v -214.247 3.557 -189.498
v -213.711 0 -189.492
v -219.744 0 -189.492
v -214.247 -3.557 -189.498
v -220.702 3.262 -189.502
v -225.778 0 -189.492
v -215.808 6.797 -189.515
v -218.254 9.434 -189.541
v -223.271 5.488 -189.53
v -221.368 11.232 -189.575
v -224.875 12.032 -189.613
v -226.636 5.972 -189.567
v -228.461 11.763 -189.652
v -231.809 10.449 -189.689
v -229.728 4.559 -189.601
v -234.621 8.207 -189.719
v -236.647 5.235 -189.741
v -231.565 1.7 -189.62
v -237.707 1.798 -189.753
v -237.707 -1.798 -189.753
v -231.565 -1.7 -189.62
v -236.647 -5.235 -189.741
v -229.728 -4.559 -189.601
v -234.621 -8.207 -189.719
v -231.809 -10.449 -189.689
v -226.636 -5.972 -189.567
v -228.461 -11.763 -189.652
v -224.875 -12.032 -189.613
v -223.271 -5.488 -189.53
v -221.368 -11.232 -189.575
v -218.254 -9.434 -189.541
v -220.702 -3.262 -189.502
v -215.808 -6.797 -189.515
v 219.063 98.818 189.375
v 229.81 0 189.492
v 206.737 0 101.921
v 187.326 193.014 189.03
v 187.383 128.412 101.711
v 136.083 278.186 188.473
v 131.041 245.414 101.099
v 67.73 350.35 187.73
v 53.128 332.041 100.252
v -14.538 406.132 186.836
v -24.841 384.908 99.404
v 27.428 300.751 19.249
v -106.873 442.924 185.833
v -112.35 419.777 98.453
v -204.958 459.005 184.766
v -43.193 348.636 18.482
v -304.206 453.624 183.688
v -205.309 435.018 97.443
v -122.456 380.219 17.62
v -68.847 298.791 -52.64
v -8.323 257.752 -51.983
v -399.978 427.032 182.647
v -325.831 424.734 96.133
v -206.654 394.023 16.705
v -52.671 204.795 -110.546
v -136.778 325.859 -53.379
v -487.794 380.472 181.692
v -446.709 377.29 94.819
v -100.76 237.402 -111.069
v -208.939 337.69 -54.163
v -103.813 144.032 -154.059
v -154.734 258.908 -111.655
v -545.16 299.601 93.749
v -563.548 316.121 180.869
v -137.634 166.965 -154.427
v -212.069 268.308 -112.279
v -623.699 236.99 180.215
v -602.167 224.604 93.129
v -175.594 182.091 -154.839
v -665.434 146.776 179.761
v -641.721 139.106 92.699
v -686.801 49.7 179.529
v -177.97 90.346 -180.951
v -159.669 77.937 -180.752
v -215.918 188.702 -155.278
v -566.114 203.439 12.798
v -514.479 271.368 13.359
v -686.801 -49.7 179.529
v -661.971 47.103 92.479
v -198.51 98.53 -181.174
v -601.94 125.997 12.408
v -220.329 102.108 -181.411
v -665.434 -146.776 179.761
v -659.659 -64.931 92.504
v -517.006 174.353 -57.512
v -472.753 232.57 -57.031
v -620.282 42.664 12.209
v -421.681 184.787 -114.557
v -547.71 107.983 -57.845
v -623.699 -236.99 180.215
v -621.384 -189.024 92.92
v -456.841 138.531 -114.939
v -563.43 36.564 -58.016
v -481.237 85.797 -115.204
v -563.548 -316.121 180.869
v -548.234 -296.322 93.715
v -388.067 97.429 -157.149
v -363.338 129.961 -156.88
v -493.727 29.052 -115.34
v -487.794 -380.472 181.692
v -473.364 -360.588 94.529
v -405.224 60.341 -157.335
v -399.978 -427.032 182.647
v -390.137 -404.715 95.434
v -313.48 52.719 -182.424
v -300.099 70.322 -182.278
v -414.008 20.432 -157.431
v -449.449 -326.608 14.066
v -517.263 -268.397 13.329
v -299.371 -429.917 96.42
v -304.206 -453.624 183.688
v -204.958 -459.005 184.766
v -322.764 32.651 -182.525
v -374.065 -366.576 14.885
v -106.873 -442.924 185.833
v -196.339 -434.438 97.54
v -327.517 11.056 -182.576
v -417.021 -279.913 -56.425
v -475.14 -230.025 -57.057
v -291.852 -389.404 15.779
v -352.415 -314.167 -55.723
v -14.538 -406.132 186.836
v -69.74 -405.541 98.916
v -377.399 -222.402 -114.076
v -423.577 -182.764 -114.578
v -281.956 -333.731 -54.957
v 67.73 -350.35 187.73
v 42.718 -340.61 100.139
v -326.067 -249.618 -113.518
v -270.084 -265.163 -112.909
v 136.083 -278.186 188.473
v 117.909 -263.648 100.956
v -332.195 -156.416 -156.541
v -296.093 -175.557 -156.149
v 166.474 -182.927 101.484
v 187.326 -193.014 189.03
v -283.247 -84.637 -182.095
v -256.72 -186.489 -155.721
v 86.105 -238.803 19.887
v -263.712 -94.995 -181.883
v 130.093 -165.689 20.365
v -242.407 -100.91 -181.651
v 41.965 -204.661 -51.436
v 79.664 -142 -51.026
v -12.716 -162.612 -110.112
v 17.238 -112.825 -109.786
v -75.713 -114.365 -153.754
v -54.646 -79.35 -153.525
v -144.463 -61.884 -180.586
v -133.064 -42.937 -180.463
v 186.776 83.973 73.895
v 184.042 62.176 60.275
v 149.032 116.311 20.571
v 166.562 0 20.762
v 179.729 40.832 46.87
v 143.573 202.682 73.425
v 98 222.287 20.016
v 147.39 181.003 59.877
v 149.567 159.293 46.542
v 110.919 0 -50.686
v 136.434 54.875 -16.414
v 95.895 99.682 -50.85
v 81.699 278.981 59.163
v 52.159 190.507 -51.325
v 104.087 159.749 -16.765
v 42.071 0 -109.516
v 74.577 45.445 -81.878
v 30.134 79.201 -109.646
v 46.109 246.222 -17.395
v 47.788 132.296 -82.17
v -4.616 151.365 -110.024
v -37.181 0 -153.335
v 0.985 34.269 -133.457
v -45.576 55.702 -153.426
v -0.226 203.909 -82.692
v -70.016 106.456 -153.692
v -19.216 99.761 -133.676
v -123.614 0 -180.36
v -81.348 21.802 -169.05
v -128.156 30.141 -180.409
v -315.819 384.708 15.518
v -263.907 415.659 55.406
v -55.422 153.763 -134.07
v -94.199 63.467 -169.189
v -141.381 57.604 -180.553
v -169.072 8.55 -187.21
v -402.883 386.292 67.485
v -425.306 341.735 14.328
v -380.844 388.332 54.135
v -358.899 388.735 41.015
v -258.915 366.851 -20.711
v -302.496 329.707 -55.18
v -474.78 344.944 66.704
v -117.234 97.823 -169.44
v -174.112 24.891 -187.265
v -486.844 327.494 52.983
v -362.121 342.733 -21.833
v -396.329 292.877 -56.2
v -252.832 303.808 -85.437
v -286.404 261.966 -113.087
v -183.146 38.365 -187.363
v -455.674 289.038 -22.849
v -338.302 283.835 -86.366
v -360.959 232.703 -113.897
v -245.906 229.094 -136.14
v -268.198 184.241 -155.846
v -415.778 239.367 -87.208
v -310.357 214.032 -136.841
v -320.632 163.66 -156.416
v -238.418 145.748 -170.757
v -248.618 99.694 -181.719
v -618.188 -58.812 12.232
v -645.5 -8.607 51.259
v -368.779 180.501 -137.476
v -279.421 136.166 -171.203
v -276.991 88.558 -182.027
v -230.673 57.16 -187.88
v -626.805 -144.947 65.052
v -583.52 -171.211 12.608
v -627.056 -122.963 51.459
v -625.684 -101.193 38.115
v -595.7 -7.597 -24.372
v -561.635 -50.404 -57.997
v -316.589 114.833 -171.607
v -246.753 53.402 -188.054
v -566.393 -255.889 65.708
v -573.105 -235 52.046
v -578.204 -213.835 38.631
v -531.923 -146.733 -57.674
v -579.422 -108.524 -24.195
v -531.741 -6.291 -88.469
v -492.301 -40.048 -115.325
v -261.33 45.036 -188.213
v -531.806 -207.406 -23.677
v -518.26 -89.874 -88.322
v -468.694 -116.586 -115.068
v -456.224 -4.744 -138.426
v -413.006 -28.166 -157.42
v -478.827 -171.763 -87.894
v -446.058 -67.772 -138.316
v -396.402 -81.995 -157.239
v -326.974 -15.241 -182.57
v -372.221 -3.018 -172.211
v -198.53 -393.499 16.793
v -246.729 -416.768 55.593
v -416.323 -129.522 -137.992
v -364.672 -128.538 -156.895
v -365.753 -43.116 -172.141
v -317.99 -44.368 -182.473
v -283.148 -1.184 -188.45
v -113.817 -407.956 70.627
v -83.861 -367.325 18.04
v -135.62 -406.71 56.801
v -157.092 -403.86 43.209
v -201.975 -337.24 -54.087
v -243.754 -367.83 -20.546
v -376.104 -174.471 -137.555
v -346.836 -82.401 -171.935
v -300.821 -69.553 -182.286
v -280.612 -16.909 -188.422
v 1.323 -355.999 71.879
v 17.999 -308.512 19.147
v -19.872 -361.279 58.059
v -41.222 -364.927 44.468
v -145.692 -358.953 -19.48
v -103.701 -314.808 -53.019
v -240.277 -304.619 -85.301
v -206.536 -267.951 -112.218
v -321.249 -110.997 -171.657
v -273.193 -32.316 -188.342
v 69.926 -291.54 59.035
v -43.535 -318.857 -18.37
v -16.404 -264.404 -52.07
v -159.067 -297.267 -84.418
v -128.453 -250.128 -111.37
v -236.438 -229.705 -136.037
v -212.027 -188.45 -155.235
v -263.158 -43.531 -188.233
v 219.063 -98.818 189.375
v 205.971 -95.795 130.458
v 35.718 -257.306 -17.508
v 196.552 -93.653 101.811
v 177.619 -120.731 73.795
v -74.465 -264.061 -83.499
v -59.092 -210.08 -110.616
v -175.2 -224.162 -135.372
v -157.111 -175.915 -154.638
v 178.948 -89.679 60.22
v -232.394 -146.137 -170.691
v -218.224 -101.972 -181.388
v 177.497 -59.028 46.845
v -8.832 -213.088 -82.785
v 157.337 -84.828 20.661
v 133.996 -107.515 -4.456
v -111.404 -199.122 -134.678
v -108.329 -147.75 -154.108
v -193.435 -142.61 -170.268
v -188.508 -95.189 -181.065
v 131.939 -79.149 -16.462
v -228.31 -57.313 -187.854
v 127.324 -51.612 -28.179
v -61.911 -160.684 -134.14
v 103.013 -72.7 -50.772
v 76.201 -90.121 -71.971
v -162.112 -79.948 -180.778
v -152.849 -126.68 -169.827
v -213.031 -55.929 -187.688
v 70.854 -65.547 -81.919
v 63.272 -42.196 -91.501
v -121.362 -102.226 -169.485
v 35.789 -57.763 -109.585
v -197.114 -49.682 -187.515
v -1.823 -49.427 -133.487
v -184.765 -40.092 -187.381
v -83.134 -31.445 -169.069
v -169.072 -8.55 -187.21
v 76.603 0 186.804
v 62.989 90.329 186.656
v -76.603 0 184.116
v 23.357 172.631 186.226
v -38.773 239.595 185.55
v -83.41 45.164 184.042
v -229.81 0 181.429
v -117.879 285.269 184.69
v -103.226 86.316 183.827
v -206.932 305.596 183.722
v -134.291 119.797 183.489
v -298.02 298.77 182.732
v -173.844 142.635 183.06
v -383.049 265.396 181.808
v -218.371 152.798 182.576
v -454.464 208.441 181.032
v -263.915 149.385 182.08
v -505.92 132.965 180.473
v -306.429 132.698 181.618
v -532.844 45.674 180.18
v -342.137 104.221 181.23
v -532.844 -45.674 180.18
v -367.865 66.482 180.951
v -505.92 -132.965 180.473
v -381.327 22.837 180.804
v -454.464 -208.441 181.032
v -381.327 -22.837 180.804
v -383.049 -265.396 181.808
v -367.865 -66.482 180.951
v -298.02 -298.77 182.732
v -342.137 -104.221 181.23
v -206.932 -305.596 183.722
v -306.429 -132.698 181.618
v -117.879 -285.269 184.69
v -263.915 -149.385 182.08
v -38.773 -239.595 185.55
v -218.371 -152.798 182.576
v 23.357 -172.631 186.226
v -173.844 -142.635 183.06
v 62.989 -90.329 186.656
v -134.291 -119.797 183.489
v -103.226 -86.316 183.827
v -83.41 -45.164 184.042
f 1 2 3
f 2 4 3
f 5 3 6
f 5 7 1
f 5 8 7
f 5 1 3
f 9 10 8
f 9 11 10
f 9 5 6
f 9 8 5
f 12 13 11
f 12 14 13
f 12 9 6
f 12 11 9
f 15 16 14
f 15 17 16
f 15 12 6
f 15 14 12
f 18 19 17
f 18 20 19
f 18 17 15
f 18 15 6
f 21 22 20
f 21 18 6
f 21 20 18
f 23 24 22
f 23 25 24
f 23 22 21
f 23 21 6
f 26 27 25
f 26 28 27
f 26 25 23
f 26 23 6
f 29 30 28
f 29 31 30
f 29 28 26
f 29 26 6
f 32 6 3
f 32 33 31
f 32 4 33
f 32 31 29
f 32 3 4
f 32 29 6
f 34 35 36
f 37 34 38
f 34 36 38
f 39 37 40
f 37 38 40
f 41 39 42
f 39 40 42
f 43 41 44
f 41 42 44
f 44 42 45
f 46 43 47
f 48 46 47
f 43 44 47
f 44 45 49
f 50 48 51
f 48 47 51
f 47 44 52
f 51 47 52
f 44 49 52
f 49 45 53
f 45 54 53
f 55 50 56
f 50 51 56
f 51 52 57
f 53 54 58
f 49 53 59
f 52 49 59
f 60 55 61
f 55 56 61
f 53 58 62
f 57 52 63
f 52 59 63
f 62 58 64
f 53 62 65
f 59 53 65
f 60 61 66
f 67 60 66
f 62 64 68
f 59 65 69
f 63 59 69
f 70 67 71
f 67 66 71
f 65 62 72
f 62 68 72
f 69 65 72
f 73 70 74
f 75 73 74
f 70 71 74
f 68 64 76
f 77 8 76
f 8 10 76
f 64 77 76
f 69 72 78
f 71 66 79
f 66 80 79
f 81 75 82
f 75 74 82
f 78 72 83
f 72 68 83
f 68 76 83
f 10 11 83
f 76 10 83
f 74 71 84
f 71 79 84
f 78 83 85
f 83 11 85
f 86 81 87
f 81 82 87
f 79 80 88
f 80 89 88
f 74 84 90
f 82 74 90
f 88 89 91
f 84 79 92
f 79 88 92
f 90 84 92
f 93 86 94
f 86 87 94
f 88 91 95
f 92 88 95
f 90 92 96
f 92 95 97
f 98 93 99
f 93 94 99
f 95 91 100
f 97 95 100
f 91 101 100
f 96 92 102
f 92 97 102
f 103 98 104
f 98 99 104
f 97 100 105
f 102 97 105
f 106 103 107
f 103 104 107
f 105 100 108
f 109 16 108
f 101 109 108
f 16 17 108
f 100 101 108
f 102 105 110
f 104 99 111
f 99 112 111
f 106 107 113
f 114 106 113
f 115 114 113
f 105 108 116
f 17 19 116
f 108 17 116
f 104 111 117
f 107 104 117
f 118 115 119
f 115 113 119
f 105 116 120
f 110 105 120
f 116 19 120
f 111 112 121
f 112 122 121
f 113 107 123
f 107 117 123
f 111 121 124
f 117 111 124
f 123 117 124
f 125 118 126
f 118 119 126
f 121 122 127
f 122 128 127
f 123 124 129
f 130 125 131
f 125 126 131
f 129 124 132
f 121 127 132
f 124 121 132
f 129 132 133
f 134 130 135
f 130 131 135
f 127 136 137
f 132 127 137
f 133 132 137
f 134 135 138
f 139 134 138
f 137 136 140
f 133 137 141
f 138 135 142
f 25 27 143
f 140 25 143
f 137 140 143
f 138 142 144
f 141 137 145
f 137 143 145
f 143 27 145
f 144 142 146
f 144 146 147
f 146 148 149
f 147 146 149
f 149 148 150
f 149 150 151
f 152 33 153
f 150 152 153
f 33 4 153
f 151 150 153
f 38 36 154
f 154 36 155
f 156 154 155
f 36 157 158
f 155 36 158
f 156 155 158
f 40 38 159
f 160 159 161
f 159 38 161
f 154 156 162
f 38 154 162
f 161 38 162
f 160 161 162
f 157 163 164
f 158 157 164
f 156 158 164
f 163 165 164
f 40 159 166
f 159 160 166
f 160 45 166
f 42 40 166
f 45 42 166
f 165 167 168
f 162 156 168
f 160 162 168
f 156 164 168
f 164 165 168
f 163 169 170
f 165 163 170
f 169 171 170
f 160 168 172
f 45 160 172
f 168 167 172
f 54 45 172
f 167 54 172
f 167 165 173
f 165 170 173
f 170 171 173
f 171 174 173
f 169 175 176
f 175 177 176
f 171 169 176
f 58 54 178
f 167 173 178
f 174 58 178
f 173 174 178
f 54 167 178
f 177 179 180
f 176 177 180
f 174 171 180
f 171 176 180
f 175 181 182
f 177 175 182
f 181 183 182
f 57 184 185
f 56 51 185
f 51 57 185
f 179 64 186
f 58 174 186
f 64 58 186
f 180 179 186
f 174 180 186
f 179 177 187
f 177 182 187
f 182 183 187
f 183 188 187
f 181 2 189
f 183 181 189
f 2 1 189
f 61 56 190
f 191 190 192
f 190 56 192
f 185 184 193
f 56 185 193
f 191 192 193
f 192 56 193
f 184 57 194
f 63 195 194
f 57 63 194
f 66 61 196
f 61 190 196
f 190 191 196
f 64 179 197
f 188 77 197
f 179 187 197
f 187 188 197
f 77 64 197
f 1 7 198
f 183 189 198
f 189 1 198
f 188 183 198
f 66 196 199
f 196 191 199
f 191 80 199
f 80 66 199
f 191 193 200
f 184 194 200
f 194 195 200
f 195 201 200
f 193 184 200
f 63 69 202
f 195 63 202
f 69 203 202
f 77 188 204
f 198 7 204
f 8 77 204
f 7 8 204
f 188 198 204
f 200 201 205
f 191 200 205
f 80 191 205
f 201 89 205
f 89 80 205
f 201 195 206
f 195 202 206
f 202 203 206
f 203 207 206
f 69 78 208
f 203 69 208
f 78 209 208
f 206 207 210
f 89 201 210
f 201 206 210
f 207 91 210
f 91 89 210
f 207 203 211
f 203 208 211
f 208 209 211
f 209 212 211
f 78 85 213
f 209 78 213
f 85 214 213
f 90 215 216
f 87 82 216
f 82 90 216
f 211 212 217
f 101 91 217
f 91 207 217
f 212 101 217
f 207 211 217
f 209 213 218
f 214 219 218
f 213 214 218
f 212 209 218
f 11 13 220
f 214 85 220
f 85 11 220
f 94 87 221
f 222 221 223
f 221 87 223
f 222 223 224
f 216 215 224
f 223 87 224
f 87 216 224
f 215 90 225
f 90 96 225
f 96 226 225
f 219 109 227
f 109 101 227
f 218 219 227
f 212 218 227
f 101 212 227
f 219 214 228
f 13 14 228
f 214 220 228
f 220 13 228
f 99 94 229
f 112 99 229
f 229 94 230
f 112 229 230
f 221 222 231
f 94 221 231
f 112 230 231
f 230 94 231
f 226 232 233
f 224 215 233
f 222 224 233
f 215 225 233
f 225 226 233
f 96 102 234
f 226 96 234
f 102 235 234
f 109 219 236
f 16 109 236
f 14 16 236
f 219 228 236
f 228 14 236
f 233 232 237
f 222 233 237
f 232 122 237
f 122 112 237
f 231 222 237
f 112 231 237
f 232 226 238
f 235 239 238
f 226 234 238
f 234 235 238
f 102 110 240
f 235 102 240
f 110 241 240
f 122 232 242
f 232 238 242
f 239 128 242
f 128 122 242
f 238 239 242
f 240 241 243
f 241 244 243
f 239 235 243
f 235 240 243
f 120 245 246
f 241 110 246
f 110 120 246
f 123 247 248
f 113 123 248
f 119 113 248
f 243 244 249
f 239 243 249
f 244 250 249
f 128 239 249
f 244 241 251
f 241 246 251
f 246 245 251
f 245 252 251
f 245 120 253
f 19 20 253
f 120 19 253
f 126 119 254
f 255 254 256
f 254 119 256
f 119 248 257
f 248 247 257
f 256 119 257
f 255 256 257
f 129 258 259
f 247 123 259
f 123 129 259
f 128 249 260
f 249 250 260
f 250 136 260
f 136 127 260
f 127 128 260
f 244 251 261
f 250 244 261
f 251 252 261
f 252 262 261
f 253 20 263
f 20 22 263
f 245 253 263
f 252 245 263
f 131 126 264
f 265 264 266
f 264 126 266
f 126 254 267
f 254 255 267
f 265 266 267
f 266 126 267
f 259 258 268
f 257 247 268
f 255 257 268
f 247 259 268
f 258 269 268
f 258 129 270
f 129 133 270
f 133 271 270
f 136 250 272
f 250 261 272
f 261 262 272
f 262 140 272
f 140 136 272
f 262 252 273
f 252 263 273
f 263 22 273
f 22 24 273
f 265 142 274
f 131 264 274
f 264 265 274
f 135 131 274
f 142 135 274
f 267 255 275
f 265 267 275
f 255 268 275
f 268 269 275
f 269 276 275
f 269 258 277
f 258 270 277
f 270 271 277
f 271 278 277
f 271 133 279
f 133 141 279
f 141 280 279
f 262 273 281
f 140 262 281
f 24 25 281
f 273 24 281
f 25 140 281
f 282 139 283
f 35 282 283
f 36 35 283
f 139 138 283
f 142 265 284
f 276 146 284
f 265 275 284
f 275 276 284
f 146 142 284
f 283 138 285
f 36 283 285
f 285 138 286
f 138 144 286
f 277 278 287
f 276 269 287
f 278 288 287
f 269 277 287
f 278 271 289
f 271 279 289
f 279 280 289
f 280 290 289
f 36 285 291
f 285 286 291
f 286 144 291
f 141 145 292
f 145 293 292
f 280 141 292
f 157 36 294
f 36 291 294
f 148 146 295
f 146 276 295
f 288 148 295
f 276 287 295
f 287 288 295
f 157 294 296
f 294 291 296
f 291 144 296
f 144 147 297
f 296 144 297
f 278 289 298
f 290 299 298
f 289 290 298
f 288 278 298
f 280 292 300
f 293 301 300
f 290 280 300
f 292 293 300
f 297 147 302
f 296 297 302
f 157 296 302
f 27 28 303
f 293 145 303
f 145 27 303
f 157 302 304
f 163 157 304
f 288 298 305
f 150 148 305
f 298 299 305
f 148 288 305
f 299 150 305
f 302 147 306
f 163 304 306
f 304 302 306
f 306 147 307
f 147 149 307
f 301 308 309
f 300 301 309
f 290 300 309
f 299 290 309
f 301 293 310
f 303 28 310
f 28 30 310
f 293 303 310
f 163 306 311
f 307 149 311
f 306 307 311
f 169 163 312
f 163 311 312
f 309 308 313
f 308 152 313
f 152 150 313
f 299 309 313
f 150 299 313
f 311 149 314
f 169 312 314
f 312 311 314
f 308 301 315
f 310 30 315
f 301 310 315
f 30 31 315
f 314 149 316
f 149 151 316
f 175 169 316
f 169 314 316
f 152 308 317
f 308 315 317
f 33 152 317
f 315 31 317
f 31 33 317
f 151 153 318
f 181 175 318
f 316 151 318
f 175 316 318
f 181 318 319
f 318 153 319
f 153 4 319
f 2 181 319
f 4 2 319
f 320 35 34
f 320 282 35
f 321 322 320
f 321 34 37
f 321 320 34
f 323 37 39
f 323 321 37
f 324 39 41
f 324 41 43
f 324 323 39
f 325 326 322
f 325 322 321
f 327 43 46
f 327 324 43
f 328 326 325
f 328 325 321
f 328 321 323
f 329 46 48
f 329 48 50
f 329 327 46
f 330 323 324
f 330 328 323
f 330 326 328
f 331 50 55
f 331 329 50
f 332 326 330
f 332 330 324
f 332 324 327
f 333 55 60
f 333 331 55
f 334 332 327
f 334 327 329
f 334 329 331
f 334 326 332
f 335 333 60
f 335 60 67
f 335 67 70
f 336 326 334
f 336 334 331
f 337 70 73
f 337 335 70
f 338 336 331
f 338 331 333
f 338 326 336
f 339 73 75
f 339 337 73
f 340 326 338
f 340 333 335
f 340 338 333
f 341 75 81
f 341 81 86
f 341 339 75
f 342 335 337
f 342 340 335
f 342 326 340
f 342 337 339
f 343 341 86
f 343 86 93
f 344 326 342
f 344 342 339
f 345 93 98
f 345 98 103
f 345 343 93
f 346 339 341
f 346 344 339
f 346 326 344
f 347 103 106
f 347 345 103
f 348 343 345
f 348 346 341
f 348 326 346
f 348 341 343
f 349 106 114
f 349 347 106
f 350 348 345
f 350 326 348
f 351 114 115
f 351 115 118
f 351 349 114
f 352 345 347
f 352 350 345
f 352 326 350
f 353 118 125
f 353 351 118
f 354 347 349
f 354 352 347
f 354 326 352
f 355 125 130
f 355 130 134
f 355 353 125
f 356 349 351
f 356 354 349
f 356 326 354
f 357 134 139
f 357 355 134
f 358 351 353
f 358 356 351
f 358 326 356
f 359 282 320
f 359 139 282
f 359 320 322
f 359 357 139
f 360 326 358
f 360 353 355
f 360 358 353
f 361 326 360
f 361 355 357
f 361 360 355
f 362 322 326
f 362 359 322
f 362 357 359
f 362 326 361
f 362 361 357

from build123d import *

# Parameters (mm, degrees)
F2_SCALE = 5


# Not quite as in the source:
# - a fillet or chamfer that OpenCascade refuses, or shapes differently, is made with other operations: its cross-section is extruded or revolved along the edge and cut away or added


with BuildPart() as f1:
    # F0 (on Front) → F1 (revolve)
    with BuildSketch(Plane.XZ):
        Polygon((45.9619096, 37.8984256), (-45.9619096, 36.2857288), (-45.1555612, -37.8984002), (45.9619096, -37.8984002), align=None)
    revolve(axis=Axis((-45.5587354, 0, -0.8063357), (-0.010868912, 0, 0.9999409316)))


with BuildPart() as f1_1:
    # F2: moved
    add(f1.part.scale(F2_SCALE))

    # F3: fillet of radius 449.015524587 on 2 edges, made by hand

    # F3_s1 → F3_t2 (revolve, cut)
    with BuildSketch(Plane.XZ):
        with BuildLine():
            ThreePointArc((229.809548, 189.492128), (77.982047099, -81.8414754589), (-213.7110771712, -189.492001))
            Line((-213.7110771712, -189.492001), (229.809548, -189.492001))
            Line((229.809548, -189.492001), (229.809548, 189.492128))
        make_face()
    revolve(axis=Axis((-225.723985986, 0, -194.4434473704), (-0.010868912, 0, 0.9999409316)), mode=Mode.SUBTRACT)


solid = f1_1.part
